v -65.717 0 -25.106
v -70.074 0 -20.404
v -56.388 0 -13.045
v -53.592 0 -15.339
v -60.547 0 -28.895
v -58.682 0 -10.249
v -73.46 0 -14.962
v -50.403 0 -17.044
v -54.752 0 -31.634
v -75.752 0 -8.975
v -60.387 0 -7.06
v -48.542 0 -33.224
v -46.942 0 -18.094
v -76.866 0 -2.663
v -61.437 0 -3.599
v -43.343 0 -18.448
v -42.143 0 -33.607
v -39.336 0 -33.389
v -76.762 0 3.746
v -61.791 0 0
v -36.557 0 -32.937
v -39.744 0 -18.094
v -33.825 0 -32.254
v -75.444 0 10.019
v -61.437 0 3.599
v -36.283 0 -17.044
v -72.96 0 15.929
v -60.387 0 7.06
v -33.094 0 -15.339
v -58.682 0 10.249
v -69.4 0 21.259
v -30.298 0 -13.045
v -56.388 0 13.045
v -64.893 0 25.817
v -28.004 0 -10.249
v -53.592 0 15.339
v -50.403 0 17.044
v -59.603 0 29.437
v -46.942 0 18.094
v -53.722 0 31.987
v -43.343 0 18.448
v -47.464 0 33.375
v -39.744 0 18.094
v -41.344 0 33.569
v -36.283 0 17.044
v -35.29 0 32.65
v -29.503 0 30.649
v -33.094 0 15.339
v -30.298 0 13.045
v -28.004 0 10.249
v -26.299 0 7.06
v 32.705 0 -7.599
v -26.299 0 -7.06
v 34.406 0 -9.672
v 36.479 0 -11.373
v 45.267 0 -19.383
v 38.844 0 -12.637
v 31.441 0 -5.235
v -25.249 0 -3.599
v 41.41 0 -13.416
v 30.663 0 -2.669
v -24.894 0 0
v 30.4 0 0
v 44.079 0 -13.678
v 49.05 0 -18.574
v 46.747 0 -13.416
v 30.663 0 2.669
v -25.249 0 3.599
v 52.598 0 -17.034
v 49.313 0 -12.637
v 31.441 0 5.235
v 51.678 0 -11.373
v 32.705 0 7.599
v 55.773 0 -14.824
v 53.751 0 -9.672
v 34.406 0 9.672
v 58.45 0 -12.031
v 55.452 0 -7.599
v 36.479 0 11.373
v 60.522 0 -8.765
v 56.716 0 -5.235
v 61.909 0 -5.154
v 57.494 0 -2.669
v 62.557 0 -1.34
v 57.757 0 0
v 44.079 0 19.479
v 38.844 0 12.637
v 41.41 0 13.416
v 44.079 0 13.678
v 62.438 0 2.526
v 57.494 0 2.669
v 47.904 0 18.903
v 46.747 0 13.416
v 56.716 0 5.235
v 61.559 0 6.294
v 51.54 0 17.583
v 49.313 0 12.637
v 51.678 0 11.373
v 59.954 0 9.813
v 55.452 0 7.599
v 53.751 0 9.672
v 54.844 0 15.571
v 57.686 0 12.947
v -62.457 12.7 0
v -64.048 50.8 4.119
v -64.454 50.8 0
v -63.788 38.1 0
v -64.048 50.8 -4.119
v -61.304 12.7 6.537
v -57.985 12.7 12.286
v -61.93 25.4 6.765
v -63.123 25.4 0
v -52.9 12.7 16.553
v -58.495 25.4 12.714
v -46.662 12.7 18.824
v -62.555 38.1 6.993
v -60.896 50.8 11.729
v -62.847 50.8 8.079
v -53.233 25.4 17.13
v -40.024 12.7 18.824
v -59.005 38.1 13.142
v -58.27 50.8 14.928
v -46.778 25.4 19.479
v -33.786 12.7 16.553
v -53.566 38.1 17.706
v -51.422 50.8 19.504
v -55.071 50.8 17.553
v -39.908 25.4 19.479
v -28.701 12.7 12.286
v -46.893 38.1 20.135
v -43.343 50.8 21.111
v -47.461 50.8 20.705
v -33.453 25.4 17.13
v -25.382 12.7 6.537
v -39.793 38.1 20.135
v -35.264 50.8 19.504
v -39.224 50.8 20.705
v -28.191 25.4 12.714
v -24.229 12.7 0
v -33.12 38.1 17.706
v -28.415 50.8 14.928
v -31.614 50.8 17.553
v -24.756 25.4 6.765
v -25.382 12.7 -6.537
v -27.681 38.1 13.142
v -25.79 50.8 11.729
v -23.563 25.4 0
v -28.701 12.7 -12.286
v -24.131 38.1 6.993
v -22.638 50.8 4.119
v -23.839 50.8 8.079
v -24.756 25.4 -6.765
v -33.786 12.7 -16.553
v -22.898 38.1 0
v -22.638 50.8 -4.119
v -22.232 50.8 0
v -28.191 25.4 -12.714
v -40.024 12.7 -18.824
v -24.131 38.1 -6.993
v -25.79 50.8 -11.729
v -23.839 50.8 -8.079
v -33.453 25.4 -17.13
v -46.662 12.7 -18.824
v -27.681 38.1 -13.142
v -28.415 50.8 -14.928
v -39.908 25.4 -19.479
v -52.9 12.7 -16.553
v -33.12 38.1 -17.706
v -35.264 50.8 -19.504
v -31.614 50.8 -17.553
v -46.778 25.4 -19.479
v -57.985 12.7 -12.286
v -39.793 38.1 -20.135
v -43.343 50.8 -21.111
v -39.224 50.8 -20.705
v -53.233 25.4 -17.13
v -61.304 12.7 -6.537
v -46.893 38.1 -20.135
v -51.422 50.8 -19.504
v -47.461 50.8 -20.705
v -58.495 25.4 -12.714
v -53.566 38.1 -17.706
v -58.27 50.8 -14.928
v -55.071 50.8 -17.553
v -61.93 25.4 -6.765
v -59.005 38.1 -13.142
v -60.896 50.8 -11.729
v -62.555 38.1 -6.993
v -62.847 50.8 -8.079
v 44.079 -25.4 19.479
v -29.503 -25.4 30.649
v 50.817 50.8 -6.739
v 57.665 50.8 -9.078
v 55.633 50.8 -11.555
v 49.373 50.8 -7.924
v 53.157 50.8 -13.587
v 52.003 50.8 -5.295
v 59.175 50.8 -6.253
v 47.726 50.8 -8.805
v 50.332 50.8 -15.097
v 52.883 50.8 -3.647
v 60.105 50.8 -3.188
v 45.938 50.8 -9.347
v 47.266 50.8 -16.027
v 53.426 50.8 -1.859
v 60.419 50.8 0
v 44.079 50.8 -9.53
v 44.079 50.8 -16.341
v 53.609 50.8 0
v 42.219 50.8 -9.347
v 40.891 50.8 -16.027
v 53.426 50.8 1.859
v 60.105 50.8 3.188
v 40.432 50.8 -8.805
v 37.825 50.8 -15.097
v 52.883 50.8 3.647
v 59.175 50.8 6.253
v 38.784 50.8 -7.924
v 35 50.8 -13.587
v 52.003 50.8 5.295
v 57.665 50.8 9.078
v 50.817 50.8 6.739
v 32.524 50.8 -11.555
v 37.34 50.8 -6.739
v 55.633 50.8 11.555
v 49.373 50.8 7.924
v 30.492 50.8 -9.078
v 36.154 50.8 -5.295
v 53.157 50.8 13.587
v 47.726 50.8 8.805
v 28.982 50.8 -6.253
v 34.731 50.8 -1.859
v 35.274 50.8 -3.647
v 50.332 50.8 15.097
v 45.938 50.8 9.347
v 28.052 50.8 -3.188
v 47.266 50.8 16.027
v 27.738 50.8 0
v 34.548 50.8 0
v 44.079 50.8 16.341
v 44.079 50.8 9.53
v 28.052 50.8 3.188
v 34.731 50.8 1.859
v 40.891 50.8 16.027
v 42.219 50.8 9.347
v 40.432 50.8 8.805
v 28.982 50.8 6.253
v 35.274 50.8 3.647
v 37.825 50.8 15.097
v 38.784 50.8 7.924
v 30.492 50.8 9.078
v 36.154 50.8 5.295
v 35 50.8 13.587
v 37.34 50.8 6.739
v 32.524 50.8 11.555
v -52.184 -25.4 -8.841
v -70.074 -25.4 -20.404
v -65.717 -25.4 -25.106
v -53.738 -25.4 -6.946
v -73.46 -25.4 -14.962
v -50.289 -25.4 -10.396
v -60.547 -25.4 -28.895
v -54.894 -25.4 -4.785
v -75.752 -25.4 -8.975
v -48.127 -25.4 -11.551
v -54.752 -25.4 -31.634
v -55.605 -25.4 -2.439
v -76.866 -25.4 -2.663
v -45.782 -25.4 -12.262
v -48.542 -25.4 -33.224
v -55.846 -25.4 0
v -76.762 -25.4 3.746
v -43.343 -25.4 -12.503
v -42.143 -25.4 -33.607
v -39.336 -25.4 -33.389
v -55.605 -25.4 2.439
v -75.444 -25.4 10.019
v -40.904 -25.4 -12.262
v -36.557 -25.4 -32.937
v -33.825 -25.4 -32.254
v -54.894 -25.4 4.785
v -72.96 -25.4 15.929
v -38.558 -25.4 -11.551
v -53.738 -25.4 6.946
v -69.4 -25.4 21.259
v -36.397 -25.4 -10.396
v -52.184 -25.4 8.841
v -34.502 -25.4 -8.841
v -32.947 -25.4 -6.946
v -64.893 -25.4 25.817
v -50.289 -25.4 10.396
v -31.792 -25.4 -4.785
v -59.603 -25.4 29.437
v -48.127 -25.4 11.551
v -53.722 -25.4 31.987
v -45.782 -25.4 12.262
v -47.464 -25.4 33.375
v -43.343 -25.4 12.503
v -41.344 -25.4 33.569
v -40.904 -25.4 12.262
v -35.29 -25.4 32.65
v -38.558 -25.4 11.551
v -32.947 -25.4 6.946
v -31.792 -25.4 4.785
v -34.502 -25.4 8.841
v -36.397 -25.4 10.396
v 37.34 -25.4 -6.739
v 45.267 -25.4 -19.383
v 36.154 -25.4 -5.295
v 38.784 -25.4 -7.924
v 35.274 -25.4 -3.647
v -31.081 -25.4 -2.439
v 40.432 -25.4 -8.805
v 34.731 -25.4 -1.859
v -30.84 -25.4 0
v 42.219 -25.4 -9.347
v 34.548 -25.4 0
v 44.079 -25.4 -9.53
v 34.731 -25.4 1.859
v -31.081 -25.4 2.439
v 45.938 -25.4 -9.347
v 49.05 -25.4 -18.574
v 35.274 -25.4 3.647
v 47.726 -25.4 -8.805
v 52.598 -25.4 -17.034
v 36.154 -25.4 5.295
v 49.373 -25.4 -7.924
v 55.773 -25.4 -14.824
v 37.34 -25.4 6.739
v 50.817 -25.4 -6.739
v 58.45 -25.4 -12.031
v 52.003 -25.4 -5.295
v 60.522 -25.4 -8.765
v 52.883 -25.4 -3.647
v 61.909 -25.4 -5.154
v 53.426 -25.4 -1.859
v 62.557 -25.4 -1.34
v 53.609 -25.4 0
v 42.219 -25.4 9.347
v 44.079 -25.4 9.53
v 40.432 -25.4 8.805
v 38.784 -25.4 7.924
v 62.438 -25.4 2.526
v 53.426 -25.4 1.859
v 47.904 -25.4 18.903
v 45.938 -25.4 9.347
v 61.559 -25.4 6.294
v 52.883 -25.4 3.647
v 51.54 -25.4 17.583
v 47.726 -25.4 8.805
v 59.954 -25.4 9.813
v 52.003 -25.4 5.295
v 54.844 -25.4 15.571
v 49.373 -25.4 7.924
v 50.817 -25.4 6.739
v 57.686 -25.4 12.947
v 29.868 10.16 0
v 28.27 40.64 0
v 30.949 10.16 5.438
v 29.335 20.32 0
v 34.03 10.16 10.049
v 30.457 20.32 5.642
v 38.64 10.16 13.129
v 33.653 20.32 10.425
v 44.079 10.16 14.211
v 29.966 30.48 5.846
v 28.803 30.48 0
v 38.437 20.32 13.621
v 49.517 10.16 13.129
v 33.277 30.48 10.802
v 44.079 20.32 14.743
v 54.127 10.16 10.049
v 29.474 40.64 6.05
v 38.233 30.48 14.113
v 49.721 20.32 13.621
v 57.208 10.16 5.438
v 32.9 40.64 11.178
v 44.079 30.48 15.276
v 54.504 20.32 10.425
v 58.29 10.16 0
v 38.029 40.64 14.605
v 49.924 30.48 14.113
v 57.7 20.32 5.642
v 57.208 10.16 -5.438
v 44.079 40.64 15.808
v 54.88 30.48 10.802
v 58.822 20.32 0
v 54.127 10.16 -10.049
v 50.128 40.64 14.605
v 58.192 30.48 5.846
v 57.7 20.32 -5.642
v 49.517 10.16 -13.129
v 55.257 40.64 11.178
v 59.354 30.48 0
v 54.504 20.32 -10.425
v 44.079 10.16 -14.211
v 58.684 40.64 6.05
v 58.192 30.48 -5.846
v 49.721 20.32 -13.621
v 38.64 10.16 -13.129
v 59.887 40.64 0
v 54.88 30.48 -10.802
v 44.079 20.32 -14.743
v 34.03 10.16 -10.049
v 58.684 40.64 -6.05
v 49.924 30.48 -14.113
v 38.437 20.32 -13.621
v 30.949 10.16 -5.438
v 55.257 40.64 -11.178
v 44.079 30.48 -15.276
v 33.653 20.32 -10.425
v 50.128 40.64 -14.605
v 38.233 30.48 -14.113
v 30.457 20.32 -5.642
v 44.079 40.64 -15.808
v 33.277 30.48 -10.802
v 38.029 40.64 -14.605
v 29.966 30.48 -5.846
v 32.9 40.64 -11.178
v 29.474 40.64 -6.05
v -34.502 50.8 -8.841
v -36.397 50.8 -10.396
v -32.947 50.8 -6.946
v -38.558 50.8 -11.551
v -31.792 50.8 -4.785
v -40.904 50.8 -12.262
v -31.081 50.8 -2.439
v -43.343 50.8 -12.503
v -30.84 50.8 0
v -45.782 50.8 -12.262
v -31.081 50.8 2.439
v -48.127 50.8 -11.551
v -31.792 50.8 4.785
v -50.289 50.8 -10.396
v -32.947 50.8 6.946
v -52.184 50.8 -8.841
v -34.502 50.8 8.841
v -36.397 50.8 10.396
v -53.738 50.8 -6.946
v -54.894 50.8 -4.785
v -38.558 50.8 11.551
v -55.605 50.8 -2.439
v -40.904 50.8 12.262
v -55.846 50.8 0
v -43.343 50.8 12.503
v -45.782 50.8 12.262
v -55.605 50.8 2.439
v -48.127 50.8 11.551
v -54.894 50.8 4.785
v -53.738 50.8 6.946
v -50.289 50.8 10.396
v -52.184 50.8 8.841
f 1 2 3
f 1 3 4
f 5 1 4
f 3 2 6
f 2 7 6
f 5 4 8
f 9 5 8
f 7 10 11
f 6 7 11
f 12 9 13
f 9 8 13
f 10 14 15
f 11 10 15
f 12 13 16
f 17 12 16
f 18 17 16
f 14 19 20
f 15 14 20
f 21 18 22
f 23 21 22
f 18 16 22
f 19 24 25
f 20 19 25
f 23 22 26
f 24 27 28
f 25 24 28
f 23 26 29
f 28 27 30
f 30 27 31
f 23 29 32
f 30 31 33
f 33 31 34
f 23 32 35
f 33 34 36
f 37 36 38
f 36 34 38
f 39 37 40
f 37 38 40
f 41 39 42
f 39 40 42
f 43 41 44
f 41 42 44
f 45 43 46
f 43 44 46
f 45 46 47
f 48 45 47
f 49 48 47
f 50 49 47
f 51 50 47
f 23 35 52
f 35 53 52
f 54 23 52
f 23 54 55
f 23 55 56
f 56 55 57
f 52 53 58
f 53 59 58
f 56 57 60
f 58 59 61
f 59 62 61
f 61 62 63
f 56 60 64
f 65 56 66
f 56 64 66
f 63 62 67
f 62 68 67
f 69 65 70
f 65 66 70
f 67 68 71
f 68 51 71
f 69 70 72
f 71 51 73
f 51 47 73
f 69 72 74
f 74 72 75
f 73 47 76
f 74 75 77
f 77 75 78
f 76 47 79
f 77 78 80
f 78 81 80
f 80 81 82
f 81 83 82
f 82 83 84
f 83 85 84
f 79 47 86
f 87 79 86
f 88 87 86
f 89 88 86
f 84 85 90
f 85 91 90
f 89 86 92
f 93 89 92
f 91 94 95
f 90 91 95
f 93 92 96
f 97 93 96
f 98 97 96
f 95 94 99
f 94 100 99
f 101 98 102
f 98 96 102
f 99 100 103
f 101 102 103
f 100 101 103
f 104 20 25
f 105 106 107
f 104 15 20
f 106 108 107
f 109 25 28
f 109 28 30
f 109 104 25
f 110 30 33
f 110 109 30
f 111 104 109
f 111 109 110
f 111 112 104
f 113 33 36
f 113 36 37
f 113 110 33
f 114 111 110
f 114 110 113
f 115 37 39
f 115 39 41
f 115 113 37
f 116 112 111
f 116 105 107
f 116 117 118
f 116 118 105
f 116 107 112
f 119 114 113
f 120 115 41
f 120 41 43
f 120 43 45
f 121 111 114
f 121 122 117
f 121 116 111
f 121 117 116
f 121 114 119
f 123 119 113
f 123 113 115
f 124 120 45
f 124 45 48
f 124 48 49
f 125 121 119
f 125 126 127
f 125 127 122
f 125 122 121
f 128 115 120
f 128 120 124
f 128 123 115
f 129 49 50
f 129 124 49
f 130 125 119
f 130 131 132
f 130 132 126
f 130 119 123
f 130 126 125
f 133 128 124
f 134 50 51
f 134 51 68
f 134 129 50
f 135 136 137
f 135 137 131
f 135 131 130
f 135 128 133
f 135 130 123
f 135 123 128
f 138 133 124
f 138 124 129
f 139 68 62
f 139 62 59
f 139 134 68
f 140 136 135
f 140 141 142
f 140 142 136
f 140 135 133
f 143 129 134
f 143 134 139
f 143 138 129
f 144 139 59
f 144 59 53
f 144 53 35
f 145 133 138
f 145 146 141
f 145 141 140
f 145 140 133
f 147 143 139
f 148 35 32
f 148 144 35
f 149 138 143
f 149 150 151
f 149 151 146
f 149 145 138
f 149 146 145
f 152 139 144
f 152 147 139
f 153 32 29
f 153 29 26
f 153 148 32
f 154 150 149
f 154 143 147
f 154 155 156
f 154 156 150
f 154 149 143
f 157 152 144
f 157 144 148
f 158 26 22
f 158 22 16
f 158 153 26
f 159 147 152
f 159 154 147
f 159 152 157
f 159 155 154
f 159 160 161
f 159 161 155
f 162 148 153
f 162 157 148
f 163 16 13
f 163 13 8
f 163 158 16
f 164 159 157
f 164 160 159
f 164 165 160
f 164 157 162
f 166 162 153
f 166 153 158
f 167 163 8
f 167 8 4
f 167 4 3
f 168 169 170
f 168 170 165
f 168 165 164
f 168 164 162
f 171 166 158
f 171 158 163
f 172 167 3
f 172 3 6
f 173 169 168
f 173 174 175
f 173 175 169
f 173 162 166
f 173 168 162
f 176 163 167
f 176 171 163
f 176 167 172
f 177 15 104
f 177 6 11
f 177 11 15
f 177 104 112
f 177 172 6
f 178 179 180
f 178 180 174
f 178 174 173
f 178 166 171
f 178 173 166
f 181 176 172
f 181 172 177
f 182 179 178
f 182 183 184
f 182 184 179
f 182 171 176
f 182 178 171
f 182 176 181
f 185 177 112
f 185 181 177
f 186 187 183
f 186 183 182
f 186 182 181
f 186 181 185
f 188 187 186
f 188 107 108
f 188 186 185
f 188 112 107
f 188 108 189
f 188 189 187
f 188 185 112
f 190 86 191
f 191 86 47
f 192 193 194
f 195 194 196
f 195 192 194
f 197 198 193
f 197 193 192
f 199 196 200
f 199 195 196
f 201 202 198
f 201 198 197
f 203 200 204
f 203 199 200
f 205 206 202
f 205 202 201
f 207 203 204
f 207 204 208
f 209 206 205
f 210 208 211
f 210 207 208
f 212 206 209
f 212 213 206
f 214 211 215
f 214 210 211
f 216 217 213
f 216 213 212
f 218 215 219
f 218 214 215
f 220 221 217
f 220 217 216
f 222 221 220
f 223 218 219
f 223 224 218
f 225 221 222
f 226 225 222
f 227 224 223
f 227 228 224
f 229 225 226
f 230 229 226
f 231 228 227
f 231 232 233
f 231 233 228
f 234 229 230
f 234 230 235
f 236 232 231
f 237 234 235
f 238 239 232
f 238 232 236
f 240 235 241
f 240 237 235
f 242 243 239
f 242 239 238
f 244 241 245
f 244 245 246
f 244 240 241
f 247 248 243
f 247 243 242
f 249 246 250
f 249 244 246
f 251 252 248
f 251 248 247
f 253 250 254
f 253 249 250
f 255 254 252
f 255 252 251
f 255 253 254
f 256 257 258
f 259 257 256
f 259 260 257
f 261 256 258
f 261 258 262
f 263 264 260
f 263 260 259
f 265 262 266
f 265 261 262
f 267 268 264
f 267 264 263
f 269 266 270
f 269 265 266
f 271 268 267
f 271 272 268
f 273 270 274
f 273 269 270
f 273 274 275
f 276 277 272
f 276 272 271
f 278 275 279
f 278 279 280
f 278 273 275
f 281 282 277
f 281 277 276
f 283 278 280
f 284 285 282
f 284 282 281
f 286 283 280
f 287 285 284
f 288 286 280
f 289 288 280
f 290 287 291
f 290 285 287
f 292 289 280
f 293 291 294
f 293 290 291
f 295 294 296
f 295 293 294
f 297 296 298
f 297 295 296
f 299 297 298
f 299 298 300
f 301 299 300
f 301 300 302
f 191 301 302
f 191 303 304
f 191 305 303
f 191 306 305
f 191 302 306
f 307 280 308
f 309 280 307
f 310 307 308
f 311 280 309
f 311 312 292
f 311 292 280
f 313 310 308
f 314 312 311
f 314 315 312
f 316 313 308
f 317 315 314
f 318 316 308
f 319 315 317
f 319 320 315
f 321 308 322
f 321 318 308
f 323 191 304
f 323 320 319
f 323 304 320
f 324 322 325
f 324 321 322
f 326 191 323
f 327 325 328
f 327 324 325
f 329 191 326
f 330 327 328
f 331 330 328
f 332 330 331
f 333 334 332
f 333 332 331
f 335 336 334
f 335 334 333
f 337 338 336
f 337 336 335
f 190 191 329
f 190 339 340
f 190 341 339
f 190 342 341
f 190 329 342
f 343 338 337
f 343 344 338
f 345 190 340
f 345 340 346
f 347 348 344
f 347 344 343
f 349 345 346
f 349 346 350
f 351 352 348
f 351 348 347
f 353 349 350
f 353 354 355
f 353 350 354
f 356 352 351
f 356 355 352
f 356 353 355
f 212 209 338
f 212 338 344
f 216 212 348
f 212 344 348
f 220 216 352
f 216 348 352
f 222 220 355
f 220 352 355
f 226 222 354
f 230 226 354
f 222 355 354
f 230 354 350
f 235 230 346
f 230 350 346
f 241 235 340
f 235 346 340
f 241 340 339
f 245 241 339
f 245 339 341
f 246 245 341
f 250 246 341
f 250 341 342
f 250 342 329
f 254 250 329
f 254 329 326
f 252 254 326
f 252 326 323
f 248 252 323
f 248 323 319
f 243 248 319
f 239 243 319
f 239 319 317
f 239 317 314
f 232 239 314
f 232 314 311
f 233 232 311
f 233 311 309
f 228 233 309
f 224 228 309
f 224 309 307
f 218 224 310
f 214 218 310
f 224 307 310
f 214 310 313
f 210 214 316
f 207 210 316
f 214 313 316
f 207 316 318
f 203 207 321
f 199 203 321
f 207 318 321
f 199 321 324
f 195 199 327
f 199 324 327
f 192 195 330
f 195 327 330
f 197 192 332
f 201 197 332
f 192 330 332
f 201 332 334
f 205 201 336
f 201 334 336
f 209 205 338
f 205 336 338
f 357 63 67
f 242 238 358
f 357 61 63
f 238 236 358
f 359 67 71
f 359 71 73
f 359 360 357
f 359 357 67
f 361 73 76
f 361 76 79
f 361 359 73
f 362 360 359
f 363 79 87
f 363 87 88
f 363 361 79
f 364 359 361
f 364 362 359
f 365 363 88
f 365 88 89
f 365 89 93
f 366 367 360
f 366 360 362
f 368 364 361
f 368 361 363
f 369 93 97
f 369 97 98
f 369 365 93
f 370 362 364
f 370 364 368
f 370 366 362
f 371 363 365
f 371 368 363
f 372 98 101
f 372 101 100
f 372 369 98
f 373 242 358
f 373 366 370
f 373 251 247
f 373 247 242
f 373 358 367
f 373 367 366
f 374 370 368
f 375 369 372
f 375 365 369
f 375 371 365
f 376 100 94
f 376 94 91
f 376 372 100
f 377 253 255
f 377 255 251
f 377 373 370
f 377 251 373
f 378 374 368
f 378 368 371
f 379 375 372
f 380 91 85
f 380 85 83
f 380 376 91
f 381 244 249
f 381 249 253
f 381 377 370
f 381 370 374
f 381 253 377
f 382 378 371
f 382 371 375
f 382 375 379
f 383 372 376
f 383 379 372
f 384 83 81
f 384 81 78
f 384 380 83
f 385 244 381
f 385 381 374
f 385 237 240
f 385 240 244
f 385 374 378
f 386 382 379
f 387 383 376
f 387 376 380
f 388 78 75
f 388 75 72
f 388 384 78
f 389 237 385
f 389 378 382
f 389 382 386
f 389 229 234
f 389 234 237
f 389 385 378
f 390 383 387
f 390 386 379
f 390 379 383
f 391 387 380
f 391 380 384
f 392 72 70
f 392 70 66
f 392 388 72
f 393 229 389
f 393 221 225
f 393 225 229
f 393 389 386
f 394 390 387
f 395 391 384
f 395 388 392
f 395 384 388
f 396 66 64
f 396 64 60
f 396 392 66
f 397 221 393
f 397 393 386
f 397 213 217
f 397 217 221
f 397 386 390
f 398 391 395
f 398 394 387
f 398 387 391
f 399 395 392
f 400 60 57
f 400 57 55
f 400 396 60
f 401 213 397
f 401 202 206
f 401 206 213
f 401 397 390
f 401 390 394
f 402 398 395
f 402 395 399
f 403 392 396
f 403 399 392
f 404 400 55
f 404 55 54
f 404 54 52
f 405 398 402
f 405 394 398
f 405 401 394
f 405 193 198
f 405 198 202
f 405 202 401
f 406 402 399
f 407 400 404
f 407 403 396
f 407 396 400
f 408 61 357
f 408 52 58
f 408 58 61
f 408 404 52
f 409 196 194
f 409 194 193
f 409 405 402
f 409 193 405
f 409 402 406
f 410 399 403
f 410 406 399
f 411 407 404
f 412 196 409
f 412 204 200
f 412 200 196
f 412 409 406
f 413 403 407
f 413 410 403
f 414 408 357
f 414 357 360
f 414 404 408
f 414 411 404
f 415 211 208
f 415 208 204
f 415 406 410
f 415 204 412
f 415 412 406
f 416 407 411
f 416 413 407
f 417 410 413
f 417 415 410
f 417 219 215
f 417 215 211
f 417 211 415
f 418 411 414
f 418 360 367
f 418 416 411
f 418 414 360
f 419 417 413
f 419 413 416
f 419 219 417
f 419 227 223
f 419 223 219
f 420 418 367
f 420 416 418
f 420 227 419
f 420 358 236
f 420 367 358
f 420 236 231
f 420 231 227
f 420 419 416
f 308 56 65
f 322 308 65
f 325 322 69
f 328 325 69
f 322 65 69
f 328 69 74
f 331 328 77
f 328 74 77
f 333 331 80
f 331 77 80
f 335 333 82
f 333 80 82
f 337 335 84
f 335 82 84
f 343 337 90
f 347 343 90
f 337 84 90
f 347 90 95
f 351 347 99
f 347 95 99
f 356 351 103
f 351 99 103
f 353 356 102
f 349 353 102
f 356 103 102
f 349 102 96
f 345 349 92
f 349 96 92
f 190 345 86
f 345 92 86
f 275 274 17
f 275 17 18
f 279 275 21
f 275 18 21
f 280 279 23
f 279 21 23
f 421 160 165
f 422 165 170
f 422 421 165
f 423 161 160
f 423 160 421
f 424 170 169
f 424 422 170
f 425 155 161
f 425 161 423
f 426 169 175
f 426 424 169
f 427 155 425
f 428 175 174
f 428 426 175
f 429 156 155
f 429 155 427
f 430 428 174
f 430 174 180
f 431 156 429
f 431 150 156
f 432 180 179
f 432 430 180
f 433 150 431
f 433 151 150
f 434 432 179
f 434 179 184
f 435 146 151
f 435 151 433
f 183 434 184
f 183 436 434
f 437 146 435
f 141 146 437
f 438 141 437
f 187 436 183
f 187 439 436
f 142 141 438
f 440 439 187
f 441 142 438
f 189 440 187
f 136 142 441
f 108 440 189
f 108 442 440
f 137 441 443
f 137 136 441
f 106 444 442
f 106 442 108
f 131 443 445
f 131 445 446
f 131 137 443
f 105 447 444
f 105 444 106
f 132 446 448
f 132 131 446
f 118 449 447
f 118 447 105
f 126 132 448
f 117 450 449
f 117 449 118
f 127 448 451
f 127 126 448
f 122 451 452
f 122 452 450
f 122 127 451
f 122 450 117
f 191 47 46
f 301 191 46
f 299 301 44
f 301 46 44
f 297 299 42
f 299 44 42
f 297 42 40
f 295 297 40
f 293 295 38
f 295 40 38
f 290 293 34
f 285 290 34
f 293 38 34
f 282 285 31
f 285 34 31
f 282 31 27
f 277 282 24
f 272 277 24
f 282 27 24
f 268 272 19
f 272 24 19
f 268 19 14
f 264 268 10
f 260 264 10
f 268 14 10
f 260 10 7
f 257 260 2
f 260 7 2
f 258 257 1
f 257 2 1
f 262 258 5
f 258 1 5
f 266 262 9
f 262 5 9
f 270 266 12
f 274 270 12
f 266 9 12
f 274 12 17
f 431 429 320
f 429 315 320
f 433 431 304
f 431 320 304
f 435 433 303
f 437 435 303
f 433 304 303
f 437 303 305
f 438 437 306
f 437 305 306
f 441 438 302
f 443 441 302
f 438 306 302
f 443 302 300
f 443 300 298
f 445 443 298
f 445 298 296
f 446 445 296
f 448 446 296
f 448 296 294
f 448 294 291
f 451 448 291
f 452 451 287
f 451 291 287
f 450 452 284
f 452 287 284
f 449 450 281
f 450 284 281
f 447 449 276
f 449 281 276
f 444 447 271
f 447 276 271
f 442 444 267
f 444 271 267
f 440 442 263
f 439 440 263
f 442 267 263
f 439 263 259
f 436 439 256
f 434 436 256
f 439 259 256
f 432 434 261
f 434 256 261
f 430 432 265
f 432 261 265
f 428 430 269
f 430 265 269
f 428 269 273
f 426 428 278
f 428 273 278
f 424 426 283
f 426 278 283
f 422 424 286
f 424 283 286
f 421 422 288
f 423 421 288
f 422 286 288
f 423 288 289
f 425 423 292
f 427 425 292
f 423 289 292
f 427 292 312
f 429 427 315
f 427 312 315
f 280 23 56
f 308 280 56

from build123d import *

# Parameters (mm, degrees)
F1_DEPTH = 25.4
F2_R     = 12.5025972882
F2_R_2   = 9.5302098869
F3_DEPTH = 25.4
F4_R     = 18.4484628598
F4_R_2   = 13.6784714259
F5_DEPTH = 50.8
F5_TAPER = -3
F6_DEPTH = 50.8
F7_DEPTH = 50.8


with BuildPart() as f1:
    # F0 (on Front) → F1 (new body)
    with BuildSketch(Plane.XZ):
        with BuildLine():
            ThreePointArc((45.2668793955, -19.3830094207), (57.6364376691, -13.0022082879), (62.6026409088, 0))
            ThreePointArc((62.6026409088, 0), (57.2322577304, 13.4404517854), (44.0785706073, 19.4792658036))
            ThreePointArc((44.0785706073, 19.4792658036), (23.6039660348, -0.5961004671), (45.2668793955, -19.3830094207))
        make_face()
        with BuildLine():
            ThreePointArc((45.2668793955, -19.3830094207), (23.6039660348, -0.5961004671), (44.0785706073, 19.4792658036))
            Line((44.0785706073, 19.4792658036), (-29.5030757231, 30.6489142731))
            ThreePointArc((-29.5030757231, 30.6489142731), (-15.0912426316, 18.2411567602), (-9.7141077437, 0))
            ThreePointArc((-9.7141077437, 0), (-16.4079870718, -20.1347082672), (-33.8247665625, -32.2537135744))
            Line((-33.8247665625, -32.2537135744), (45.2668793955, -19.3830094207))
        make_face()
        with BuildLine():
            Line((-47.4639300675, 33.3753608701), (-29.5030757231, 30.6489142731))
            ThreePointArc((-29.5030757231, 30.6489142731), (-38.2959099688, 33.2479326289), (-47.4639300675, 33.3753608701))
        make_face()
        with BuildLine():
            ThreePointArc((-9.7141077437, 0), (-15.0912426316, 18.2411567602), (-29.5030757231, 30.6489142731))
            Line((-29.5030757231, 30.6489142731), (-47.4639300675, 33.3753608701))
            ThreePointArc((-47.4639300675, 33.3753608701), (-76.8661552323, -2.6627929941), (-42.1434023047, -33.6074178539))
            Line((-42.1434023047, -33.6074178539), (-33.8247665625, -32.2537135744))
            ThreePointArc((-33.8247665625, -32.2537135744), (-16.4079870718, -20.1347082672), (-9.7141077437, 0))
        make_face()
        with BuildLine():
            ThreePointArc((-42.1434023047, -33.6074178539), (-37.9415084281, -33.1921991348), (-33.8247665625, -32.2537135744))
            Line((-33.8247665625, -32.2537135744), (-42.1434023047, -33.6074178539))
        make_face()
    extrude(amount=F1_DEPTH)

    # F2 (on face) → F3 (cut)
    with BuildSketch(Plane.XZ.offset(25.4)):
        with Locations((-43.3429256082, 0)):
            Circle(F2_R)
        with Locations((44.0785706073, 0)):
            Circle(F2_R_2)
    extrude(amount=-F3_DEPTH, mode=Mode.SUBTRACT)

    # F4 (on face) → F5 (join)
    with BuildSketch(Plane(origin=(0, 0, 0), x_dir=(-1, 0, 0), z_dir=(0, 1, 0))):
        with Locations((43.3429256082, 0)):
            Circle(F4_R)
        with Locations((-44.0785706073, 0)):
            Circle(F4_R_2)
    extrude(amount=F5_DEPTH, taper=F5_TAPER)

    # F6 (cut): a face of the model
    f6_faces = [f1.faces().sort_by_distance(p)[0] for p in [
        (-43.3429256082, 0, 0),
    ]]
    extrude(f6_faces, amount=-F6_DEPTH, mode=Mode.SUBTRACT)

    # F7 (cut): a face of the model
    f7_faces = [f1.faces().sort_by_distance(p)[0] for p in [
        (44.0785706073, 0, 0),
    ]]
    extrude(f7_faces, amount=-F7_DEPTH, mode=Mode.SUBTRACT)


solid = f1.part
